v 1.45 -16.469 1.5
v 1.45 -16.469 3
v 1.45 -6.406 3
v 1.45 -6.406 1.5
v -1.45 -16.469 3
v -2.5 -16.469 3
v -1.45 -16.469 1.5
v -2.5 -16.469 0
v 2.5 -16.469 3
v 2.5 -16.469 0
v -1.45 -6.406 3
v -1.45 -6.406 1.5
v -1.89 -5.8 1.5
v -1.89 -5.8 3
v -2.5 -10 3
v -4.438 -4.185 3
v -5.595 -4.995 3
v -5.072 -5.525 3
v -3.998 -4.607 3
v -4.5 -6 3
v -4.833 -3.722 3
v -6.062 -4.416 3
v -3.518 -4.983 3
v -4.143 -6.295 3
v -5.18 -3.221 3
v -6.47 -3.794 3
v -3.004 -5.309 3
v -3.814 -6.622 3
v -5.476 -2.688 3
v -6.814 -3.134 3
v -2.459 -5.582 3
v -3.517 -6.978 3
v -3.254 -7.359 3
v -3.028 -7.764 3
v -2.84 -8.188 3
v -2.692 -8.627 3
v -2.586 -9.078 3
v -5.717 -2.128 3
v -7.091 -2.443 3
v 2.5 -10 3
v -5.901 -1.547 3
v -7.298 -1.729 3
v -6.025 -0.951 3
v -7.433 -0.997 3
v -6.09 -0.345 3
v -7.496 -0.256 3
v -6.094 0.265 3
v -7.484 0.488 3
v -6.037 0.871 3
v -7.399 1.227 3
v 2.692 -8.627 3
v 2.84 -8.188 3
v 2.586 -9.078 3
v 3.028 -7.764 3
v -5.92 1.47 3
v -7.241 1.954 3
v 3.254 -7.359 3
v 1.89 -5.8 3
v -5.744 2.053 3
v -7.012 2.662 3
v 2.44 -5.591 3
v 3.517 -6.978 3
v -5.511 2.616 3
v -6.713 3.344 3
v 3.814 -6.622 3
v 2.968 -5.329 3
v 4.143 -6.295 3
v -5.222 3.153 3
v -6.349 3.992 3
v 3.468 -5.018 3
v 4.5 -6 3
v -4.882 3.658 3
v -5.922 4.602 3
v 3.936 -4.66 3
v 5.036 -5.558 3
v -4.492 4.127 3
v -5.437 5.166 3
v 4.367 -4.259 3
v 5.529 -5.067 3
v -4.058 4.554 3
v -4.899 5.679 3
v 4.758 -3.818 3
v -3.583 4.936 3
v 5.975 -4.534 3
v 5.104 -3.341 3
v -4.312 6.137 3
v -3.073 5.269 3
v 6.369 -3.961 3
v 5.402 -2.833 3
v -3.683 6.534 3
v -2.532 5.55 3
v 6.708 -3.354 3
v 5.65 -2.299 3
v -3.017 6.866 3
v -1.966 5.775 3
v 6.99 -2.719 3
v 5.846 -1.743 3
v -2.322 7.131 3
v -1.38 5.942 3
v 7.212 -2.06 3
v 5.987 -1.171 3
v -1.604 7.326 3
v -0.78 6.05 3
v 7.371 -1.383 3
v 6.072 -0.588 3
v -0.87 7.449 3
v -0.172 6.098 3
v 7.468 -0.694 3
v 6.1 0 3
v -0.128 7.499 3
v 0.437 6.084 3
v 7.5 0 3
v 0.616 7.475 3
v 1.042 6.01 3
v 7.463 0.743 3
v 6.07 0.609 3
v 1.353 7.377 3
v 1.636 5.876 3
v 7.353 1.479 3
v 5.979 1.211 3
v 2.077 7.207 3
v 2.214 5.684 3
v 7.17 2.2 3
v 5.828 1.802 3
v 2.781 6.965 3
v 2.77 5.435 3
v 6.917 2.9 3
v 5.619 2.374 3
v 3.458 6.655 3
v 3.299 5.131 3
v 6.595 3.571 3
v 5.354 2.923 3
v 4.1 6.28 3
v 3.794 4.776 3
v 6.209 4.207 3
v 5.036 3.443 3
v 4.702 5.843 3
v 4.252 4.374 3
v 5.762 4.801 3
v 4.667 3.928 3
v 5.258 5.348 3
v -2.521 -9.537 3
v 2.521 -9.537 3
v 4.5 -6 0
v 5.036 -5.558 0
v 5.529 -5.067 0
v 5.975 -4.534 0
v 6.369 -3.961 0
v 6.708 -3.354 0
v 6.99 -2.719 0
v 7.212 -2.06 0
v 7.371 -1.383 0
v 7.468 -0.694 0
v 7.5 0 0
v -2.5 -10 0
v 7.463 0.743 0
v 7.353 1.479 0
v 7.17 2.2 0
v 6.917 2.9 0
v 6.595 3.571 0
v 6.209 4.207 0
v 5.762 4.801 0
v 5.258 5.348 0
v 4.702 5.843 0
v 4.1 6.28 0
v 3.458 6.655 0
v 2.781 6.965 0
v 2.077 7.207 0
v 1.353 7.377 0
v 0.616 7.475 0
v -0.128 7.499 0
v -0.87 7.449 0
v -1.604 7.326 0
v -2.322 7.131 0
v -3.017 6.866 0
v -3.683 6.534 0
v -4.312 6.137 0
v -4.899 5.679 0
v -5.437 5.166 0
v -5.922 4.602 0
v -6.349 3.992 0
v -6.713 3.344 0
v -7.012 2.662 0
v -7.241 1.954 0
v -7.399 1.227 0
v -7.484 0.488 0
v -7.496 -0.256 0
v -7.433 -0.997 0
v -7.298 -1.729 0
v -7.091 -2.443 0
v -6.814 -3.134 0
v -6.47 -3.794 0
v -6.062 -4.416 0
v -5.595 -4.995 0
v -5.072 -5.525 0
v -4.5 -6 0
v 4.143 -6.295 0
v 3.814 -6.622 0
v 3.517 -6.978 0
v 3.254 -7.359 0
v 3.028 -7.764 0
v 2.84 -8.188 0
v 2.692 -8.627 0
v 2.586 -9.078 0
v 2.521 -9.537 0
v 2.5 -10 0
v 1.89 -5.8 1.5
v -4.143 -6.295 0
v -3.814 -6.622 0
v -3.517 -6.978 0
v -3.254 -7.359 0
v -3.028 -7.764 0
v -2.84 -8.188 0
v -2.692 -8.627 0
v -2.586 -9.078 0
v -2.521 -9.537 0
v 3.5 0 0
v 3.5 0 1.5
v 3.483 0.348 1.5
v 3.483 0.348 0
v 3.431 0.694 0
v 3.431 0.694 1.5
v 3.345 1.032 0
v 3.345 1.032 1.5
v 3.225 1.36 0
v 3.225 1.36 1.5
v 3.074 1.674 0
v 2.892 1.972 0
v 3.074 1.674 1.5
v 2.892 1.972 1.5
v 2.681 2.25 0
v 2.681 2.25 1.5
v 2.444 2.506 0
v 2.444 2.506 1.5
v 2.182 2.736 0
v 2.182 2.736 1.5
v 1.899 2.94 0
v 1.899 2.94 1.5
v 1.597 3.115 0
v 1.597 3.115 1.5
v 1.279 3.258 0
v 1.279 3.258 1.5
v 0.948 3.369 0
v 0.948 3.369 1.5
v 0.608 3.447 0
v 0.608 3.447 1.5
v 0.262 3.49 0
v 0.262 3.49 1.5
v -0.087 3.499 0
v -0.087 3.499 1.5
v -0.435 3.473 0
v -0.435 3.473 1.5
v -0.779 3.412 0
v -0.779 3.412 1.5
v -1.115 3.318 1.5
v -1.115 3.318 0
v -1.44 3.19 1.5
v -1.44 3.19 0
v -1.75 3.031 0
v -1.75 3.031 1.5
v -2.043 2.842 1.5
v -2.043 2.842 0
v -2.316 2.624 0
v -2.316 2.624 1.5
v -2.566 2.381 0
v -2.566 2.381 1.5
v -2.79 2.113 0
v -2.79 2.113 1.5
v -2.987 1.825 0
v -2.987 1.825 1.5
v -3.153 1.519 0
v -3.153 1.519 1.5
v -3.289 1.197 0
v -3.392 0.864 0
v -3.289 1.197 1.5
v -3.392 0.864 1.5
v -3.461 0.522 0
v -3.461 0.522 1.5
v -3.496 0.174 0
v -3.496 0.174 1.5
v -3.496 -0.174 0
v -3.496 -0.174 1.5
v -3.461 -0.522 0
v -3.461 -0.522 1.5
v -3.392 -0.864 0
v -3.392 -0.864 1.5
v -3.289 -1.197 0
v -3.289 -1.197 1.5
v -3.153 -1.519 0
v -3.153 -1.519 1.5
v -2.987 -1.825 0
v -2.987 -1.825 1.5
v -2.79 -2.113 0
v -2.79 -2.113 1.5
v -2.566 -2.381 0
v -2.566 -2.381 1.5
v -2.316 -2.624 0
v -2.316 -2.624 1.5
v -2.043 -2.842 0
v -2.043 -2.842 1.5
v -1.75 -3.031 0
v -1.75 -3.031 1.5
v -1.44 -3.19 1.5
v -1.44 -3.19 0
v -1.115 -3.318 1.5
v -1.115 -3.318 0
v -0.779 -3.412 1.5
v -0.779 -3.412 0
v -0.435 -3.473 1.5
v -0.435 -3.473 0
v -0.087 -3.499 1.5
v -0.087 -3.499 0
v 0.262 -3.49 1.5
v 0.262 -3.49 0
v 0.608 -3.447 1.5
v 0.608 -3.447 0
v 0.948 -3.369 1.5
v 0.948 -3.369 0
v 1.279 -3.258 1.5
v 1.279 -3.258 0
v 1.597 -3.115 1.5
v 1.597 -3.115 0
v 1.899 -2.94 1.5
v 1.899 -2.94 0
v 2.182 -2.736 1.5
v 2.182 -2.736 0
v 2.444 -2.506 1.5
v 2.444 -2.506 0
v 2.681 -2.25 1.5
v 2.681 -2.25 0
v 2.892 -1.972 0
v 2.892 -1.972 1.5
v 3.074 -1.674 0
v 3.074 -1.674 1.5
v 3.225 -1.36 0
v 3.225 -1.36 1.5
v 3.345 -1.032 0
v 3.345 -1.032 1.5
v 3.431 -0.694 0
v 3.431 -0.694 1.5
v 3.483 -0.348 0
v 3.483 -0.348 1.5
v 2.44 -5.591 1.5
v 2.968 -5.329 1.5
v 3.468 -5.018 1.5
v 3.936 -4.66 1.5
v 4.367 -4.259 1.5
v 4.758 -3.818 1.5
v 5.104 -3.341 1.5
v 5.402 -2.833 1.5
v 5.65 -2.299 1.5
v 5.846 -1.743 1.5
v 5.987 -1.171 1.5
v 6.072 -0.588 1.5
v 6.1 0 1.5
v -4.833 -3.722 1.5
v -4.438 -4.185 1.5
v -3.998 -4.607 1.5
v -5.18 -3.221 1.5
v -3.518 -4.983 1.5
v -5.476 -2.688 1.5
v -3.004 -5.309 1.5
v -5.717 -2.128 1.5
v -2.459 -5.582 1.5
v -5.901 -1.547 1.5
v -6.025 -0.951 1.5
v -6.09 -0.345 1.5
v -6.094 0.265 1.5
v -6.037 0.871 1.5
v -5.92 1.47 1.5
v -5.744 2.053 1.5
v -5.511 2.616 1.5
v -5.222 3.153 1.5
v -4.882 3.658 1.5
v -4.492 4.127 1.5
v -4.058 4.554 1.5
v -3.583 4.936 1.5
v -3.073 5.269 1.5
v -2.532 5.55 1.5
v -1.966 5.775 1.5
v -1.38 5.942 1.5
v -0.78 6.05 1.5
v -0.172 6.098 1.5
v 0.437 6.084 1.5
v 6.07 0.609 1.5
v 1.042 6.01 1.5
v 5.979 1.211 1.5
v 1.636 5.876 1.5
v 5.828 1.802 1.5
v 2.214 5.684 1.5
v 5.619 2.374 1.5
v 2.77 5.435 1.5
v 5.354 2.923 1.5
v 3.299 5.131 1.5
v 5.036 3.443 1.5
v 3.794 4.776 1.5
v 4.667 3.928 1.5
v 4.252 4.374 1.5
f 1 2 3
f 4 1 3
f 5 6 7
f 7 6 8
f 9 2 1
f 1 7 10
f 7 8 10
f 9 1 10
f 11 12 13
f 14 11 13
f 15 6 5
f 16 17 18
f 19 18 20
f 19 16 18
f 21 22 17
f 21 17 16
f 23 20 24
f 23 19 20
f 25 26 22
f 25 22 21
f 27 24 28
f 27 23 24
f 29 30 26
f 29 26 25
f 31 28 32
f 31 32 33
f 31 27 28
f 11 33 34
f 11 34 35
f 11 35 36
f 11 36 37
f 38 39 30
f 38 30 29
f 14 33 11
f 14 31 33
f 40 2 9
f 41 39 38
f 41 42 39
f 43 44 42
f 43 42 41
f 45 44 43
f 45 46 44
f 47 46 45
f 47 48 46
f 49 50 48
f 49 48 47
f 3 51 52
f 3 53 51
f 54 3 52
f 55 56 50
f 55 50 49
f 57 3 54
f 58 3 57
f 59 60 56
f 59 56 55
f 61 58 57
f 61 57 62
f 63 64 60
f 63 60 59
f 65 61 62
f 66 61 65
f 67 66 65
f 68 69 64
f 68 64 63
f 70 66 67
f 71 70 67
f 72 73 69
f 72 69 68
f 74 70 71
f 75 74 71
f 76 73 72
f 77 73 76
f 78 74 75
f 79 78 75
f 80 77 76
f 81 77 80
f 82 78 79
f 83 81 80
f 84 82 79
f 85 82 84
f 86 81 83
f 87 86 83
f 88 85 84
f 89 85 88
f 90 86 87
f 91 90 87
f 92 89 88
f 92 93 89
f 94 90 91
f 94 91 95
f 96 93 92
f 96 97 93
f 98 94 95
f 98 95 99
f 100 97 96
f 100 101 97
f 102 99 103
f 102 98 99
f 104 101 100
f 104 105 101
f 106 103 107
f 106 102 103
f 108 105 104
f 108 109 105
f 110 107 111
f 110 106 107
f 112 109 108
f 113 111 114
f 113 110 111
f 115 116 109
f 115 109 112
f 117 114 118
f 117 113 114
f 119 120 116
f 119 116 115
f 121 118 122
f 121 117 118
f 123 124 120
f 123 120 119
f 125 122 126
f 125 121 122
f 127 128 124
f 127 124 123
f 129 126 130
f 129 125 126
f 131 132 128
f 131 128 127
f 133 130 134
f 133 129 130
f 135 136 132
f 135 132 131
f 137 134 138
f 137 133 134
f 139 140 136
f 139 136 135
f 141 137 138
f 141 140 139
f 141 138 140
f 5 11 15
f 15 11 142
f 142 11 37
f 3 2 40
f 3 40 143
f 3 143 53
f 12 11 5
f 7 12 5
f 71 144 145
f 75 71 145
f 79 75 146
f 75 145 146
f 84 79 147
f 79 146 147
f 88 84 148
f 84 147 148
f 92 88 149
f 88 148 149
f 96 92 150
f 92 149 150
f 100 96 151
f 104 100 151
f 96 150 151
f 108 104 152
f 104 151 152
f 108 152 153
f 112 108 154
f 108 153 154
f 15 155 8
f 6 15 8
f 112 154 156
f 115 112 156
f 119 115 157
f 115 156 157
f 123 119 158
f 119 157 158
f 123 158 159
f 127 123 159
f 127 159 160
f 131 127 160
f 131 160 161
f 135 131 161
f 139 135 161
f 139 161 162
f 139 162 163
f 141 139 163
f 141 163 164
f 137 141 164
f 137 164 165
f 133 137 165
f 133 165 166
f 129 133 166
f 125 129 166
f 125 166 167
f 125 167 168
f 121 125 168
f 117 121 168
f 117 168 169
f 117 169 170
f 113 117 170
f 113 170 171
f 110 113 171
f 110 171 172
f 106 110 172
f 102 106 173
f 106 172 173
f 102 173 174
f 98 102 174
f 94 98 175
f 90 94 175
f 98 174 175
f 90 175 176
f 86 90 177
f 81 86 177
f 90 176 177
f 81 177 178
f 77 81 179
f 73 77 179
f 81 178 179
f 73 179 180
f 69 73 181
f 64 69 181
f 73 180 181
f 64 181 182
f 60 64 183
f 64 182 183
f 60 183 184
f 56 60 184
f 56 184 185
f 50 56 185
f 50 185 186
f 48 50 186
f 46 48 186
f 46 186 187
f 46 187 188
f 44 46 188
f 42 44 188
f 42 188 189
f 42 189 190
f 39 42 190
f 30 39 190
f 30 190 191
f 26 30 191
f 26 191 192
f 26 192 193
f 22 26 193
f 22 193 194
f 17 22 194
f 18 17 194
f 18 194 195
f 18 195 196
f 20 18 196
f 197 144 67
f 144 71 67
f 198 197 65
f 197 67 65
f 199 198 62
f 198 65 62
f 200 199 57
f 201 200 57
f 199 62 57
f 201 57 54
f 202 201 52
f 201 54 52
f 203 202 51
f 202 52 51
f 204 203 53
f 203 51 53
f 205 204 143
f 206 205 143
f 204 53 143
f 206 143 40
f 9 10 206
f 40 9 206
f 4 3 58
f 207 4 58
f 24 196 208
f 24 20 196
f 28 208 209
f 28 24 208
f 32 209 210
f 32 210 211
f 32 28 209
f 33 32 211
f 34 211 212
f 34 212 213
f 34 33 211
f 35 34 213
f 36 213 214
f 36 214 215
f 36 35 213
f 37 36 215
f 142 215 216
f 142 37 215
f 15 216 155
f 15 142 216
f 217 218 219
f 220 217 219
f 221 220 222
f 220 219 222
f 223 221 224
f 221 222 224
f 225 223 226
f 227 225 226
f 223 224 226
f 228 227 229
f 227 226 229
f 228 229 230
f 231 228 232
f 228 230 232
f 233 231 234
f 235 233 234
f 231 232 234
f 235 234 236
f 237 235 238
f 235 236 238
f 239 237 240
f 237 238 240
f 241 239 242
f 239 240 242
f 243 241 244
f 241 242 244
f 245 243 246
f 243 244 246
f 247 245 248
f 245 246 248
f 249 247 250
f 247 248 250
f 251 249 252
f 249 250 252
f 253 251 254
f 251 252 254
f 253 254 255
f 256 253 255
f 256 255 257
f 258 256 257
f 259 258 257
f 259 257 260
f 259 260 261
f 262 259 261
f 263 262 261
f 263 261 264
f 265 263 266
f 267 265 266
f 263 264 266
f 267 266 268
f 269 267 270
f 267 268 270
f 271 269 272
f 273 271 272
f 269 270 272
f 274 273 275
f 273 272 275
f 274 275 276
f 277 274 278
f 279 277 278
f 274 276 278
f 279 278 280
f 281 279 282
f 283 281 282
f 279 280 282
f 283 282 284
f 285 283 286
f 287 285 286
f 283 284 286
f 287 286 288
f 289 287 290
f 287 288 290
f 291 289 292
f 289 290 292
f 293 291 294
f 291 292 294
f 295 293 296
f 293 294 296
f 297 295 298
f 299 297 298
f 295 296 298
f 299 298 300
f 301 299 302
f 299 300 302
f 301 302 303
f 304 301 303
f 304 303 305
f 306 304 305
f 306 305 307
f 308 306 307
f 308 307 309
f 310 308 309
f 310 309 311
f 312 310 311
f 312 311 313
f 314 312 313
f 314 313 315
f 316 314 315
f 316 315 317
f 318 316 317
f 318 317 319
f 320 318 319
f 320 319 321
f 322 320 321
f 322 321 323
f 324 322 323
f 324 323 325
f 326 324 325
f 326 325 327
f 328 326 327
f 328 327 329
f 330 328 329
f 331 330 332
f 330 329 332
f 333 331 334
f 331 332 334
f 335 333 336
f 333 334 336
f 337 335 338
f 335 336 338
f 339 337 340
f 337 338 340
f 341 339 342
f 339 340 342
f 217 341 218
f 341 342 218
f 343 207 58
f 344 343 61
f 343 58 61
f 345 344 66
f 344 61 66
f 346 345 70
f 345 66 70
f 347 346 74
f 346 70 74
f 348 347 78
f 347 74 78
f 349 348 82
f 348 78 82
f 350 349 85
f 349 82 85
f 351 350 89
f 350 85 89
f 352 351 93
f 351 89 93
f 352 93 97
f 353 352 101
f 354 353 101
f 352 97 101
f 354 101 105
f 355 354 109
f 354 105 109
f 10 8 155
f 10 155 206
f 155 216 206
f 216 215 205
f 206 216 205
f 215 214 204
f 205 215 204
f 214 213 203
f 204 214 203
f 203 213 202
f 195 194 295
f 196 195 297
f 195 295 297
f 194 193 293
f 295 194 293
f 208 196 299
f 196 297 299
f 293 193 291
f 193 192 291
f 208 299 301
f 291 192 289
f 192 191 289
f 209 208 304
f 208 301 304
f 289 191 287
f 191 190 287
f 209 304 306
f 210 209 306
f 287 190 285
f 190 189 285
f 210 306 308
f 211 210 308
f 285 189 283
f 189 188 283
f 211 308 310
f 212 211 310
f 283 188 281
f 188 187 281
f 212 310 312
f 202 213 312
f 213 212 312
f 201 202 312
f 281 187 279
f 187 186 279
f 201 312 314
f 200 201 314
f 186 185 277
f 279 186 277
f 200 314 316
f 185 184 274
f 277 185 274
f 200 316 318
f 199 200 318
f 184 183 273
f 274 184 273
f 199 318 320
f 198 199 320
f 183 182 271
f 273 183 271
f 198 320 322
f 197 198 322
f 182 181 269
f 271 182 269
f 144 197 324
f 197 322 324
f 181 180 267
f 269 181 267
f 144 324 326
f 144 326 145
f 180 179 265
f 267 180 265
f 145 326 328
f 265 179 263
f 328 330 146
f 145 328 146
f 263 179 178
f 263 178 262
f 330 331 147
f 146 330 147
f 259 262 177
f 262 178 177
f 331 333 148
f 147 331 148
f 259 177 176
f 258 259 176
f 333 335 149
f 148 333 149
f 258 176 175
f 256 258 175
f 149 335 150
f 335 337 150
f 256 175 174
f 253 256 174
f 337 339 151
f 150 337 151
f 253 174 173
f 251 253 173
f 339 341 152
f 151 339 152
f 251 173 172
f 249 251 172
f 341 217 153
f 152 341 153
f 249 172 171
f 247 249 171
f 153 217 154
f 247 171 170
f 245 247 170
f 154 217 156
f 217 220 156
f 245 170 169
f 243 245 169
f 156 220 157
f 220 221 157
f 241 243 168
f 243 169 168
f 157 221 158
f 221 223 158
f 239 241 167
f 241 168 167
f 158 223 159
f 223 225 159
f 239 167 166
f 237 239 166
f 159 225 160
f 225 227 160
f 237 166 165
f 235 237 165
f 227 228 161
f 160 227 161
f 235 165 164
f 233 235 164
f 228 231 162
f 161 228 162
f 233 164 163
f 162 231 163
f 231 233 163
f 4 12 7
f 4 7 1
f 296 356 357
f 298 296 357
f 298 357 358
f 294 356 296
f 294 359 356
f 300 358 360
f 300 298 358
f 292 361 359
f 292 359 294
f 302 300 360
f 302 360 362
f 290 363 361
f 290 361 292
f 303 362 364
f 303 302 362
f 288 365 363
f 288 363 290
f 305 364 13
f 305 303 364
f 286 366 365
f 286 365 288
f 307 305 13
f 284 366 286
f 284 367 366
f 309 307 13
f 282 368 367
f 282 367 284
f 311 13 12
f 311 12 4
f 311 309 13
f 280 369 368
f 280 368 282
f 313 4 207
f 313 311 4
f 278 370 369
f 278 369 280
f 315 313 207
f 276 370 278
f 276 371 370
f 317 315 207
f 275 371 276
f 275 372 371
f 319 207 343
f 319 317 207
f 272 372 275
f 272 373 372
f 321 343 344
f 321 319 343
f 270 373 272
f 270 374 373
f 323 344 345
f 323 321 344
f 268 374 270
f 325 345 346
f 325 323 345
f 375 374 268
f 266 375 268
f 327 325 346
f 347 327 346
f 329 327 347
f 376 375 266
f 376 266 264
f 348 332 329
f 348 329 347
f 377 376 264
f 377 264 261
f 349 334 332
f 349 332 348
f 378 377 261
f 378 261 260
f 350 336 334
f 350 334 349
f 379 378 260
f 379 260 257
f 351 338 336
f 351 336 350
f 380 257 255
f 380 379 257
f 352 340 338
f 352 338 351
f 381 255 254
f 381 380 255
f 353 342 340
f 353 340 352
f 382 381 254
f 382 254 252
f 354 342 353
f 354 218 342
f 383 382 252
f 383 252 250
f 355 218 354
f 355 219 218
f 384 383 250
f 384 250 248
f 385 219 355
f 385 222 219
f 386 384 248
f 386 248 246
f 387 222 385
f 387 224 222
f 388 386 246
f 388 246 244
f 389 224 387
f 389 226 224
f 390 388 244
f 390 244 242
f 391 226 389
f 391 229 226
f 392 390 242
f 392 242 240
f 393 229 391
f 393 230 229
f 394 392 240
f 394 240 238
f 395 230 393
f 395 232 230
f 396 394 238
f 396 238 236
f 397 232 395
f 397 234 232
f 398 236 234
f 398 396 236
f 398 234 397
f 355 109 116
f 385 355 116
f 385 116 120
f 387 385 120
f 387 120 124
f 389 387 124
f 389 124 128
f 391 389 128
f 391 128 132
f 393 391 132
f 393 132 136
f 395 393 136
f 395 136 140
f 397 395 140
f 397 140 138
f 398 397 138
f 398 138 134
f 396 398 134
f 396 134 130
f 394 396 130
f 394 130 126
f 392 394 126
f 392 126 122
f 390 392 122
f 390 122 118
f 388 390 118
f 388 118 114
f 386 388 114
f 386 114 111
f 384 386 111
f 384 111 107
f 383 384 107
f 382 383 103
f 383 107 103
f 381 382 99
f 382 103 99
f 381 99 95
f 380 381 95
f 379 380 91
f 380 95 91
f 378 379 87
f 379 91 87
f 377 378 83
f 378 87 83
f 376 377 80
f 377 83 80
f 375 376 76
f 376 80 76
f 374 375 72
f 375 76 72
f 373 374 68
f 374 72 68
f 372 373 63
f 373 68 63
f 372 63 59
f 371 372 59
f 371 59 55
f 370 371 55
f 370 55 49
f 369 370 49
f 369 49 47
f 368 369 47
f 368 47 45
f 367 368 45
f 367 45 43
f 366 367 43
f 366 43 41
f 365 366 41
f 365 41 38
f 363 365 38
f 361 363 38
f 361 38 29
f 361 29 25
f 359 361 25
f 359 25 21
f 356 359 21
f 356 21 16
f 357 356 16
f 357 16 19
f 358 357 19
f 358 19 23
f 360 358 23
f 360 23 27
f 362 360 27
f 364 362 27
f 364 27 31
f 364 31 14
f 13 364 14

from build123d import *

# Parameters (mm, degrees)
F1_DEPTH    = 3
F3_DEPTH    = 1.5
F4_R        = 3.5
F5_DEPTH    = 1.5
F6_T1_DEPTH = 2.7420993995
F7_R        = 5


# Not quite as in the source:
# - a fillet or chamfer that OpenCascade refuses, or shapes differently, is made with other operations: its cross-section is extruded or revolved along the edge and cut away or added


with BuildPart() as f1:
    # F0 (on Top) → F1 (new body)
    with BuildSketch(Plane.XY):
        with BuildLine():
            ThreePointArc((2.5, -7.0710678119), (6.123724357, -4.3301270189), (7.5, 0))
            ThreePointArc((7.5, 0), (-4.3301270189, 6.123724357), (-2.5, -7.0710678119))
            Line((-2.5, -7.0710678119), (2.5, -7.0710678119))
        make_face()
        with BuildLine():
            Line((2.5, -7.0710678119), (-2.5, -7.0710678119))
            ThreePointArc((-2.5, -7.0710678119), (0, -7.5), (2.5, -7.0710678119))
        make_face()
        with BuildLine():
            ThreePointArc((2.5, -7.0710678119), (0, -7.5), (-2.5, -7.0710678119))
            Line((-2.5, -7.0710678119), (-2.5, -16.4693647414))
            Line((-2.5, -16.4693647414), (2.5, -16.4693647414))
            Line((2.5, -16.4693647414), (2.5, -7.0710678119))
        make_face()
    extrude(amount=F1_DEPTH)

    # F2 (on face) → F3 (cut)
    with BuildSketch(Plane.XY.offset(3)):
        with BuildLine():
            ThreePointArc((1.45, -5.9251582257), (4.79869774, -3.7659660115), (6.1, 0))
            ThreePointArc((6.1, 0), (-3.7659660115, 4.79869774), (-1.45, -5.9251582257))
            Line((-1.45, -5.9251582257), (1.45, -5.9251582257))
        make_face()
        with BuildLine():
            Line((1.45, -5.9251582257), (-1.45, -5.9251582257))
            ThreePointArc((-1.45, -5.9251582257), (0, -6.1), (1.45, -5.9251582257))
        make_face()
        with BuildLine():
            ThreePointArc((1.45, -5.9251582257), (0, -6.1), (-1.45, -5.9251582257))
            Line((-1.45, -5.9251582257), (-1.45, -16.4693647414))
            Line((-1.45, -16.4693647414), (1.45, -16.4693647414))
            Line((1.45, -16.4693647414), (1.45, -5.9251582257))
        make_face()
    extrude(amount=-F3_DEPTH, mode=Mode.SUBTRACT)

    # F4 (on face) → F5 (cut, through all)
    with BuildSketch(Plane.XY.offset(1.5)):
        Circle(F4_R)
    extrude(amount=-F5_DEPTH, mode=Mode.SUBTRACT)

    # F6: chamfer of 0.5 on 2 edges, made by hand

    # F6_s2 → F6_t1 (cut)
    with BuildSketch(Plane.XY.offset(1.5)):
        with BuildLine():
            Line((1.4382509018, -6.4218590468), (1.9014892015, -5.7837185114))
            Line((1.9014892015, -5.7837185114), (1.8983912669, -5.7742104726))
            ThreePointArc((1.8983912669, -5.7742104726), (1.6758695773, -5.854874991), (1.4476229508, -5.9154448516))
            Line((1.4476229508, -5.9154448516), (1.44, -5.9251582257))
            ThreePointArc((1.44, -5.9251582257), (1.44, -6.1735086363), (1.4282509018, -6.4218590468))
            Line((1.4282509018, -6.4218590468), (1.4382509018, -6.4218590468))
        make_face()
        with BuildLine():
            Line((-1.4382509018, -6.4218590468), (-1.9014892015, -5.7837185114))
            Line((-1.9014892015, -5.7837185114), (-1.8983912669, -5.7742104726))
            ThreePointArc((-1.8983912669, -5.7742104726), (-1.6758695773, -5.854874991), (-1.4476229508, -5.9154448516))
            Line((-1.4476229508, -5.9154448516), (-1.44, -5.9251582257))
            ThreePointArc((-1.44, -5.9251582257), (-1.44, -6.1735086363), (-1.4282509018, -6.4218590468))
            Line((-1.4282509018, -6.4218590468), (-1.4382509018, -6.4218590468))
        make_face()
    extrude(amount=F6_T1_DEPTH, mode=Mode.SUBTRACT)

    # F7
    f7_edges = [f1.edges().sort_by_distance(p)[0] for p in [
        (-2.5, -7.071068, 1.5),
        (2.5, -7.071068, 1.5),
    ]]
    fillet(f7_edges, radius=F7_R)


solid = f1.part
